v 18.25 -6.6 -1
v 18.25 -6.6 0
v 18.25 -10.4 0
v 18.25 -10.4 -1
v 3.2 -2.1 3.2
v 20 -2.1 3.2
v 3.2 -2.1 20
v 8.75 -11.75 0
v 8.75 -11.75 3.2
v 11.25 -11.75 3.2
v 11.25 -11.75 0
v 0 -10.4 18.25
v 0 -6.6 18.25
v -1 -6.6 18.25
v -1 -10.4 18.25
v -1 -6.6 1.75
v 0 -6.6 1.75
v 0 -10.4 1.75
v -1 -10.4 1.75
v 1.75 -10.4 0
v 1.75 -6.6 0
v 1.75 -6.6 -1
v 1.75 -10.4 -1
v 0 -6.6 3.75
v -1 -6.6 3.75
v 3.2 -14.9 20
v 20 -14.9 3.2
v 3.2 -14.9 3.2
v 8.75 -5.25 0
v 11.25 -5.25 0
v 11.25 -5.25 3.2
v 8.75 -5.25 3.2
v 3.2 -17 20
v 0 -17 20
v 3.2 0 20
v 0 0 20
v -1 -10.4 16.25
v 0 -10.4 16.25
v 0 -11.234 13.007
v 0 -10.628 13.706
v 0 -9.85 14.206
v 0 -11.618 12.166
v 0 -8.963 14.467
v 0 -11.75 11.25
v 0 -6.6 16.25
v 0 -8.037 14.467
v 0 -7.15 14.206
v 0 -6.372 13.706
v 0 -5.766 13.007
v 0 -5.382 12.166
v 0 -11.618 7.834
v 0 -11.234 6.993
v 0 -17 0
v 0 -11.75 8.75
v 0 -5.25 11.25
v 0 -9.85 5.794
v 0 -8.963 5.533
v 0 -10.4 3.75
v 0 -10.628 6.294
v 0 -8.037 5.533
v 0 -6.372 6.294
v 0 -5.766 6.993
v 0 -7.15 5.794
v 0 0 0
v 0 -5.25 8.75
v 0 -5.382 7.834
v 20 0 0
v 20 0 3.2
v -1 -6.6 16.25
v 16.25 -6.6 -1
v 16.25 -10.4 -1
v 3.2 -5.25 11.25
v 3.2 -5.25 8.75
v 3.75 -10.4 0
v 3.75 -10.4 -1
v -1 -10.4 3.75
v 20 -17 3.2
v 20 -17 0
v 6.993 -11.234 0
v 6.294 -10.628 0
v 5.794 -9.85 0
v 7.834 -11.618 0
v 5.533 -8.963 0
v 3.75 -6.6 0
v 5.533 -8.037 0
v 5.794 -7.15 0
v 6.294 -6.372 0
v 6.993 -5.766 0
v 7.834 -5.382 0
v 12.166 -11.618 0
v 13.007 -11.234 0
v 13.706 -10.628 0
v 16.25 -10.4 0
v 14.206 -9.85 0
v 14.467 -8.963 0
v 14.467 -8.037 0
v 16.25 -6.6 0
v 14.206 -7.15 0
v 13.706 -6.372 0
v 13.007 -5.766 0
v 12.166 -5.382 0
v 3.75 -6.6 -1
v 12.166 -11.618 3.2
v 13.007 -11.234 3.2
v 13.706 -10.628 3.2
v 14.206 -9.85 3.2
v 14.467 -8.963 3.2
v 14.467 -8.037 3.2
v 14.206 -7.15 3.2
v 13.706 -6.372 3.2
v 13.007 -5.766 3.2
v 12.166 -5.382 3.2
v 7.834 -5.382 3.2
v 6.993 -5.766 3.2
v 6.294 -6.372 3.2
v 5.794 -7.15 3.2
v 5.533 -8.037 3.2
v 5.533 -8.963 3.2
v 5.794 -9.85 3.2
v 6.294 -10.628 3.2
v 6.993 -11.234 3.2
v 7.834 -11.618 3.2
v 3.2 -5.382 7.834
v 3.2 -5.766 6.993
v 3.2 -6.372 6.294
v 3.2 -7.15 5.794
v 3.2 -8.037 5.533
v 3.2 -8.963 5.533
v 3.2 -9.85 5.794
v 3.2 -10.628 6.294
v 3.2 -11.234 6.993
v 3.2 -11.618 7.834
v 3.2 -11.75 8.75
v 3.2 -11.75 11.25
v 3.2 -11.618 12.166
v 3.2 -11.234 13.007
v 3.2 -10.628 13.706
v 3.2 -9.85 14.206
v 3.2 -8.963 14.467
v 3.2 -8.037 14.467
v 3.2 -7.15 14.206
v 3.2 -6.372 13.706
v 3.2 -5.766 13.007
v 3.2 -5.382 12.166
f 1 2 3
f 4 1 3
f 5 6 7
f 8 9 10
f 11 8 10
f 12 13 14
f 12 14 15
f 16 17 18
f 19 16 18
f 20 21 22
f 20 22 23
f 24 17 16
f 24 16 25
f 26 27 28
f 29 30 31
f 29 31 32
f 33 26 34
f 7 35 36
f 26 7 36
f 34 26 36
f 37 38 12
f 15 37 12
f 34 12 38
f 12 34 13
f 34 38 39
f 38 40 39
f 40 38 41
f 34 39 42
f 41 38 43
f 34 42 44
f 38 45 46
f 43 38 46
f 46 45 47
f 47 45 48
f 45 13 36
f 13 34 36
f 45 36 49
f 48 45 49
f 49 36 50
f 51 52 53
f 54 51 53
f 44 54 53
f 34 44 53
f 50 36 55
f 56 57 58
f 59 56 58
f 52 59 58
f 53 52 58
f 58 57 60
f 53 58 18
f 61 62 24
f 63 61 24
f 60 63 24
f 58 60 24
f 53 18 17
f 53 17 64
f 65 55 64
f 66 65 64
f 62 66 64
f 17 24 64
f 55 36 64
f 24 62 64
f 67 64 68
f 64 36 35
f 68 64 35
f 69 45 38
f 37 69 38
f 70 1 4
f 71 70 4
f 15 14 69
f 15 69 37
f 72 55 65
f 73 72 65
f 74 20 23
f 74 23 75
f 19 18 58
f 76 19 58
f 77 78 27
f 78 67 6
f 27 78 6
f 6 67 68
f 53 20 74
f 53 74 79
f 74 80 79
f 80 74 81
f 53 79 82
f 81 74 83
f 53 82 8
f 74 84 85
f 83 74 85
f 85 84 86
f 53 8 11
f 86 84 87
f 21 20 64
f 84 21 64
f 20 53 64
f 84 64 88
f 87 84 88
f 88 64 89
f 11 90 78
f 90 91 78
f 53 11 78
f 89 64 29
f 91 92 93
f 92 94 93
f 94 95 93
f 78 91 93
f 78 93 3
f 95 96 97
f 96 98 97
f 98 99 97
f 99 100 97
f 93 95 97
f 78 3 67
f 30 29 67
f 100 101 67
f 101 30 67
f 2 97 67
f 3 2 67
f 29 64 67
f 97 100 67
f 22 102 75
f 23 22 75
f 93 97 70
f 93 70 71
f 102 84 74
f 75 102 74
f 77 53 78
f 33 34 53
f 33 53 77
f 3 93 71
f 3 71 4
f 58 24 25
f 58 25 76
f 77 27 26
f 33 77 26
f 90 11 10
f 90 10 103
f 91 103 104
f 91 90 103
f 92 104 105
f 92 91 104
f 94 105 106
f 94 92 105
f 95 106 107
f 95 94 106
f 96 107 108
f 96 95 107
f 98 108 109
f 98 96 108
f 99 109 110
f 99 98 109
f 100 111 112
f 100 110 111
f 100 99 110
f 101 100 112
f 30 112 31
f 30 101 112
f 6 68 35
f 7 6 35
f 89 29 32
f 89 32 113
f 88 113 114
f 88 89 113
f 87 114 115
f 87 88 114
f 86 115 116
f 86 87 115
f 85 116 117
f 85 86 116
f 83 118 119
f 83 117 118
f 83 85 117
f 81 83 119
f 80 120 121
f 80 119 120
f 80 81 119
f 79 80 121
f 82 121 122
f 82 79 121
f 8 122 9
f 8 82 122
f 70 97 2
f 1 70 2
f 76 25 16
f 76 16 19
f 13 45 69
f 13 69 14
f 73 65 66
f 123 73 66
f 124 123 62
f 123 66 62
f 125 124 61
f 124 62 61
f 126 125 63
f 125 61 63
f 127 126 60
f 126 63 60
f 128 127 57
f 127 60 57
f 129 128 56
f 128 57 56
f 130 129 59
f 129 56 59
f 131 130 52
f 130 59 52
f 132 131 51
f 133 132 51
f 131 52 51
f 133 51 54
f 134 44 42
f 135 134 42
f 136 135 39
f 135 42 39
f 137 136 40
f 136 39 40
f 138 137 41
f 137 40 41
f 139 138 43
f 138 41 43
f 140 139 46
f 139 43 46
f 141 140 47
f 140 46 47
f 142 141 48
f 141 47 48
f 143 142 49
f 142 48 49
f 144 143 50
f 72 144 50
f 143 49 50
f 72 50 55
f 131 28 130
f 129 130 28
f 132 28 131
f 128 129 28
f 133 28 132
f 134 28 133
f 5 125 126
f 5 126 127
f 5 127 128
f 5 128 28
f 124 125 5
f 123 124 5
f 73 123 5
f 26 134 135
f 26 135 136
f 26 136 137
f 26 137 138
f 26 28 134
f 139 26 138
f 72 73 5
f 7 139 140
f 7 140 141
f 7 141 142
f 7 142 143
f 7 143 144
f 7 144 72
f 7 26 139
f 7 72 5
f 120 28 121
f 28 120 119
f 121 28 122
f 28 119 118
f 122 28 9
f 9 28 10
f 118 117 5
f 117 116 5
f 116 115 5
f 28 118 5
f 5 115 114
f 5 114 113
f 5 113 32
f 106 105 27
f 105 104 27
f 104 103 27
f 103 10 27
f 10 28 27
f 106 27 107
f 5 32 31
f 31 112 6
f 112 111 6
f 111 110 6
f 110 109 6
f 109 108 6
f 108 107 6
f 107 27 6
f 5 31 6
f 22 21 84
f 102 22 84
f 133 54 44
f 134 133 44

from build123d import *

# Parameters (mm, degrees)
F1_DEPTH  = 17
F2_W      = 12.8
F2_H      = 16.8
F3_DEPTH  = 16.8
F5_DEPTH  = 5
F11_W     = 3.8
F11_H     = 2
F12_DEPTH = 1


with BuildPart() as f1:
    # F0 (on Front) → F1 (new body)
    with BuildSketch(Plane.XZ):
        Polygon((0, 20), (0, 0), (20, 0), (20, 3.2), (3.2, 20), align=None)
    extrude(amount=F1_DEPTH)

    # F2 (on face) → F3 (cut)
    with BuildSketch(Plane.YZ.offset(20)):
        with Locations((-8.5, 11.6)):
            Rectangle(F2_W, F2_H)
    extrude(amount=-F3_DEPTH, mode=Mode.SUBTRACT)


with BuildPart() as f5:
    # F4 (on face) → F5 (new body)
    with BuildSketch(Plane(origin=(0, 0, 0), x_dir=(0, -1, 0), z_dir=(-1, 0, 0))):
        with BuildLine():
            ThreePointArc((5.25, 8.75), (8.5, 5.5), (11.75, 8.75))
            Line((11.75, 8.75), (11.75, 11.25))
            ThreePointArc((11.75, 11.25), (8.5, 14.5), (5.25, 11.25))
            Line((5.25, 11.25), (5.25, 8.75))
        make_face()
    extrude(amount=-F5_DEPTH)


with BuildPart() as f9_1:
    # F9: instance of F5
    add(f5.part.mirror(Plane(origin=(11.6, -2.1, 11.6), x_dir=(-0.7071067812, 0, -0.7071067812), z_dir=(0.7071067812, 0, -0.7071067812))))


with BuildPart() as f1_1:
    add(f1.part)

    # F10: cut F5, F9_1
    add(f5.part, mode=Mode.SUBTRACT)
    add(f9_1.part, mode=Mode.SUBTRACT)



with BuildPart() as f12:
    # F11 (on face) → F12 (new body)
    with BuildSketch(Plane(origin=(0, 0, 0), x_dir=(0, -1, 0), z_dir=(-1, 0, 0))):
        with Locations((8.5, 17.25)):
            Rectangle(F11_W, F11_H)
    extrude(amount=F12_DEPTH)


with BuildPart() as f12b:
    # F11 (on face) → F12, piece 2 (new body)
    with BuildSketch(Plane(origin=(0, 0, 0), x_dir=(0, -1, 0), z_dir=(-1, 0, 0))):
        with Locations((8.5, 2.75)):
            Rectangle(F11_W, F11_H)
    extrude(amount=F12_DEPTH)


with BuildPart() as f1_2:
    add(f1_1.part)

    add(f12.part)  # F13 merges F12

    add(f12b.part)  # F13 merges F12b
    # F13: F12, F12b across plane
    add(f12.part.mirror(Plane(origin=(11.6, -2.1, 11.6), x_dir=(-0.7071067812, 0, -0.7071067812), z_dir=(0.7071067812, 0, -0.7071067812))))
    add(f12b.part.mirror(Plane(origin=(11.6, -2.1, 11.6), x_dir=(-0.7071067812, 0, -0.7071067812), z_dir=(0.7071067812, 0, -0.7071067812))))


solid = f1_2.part
